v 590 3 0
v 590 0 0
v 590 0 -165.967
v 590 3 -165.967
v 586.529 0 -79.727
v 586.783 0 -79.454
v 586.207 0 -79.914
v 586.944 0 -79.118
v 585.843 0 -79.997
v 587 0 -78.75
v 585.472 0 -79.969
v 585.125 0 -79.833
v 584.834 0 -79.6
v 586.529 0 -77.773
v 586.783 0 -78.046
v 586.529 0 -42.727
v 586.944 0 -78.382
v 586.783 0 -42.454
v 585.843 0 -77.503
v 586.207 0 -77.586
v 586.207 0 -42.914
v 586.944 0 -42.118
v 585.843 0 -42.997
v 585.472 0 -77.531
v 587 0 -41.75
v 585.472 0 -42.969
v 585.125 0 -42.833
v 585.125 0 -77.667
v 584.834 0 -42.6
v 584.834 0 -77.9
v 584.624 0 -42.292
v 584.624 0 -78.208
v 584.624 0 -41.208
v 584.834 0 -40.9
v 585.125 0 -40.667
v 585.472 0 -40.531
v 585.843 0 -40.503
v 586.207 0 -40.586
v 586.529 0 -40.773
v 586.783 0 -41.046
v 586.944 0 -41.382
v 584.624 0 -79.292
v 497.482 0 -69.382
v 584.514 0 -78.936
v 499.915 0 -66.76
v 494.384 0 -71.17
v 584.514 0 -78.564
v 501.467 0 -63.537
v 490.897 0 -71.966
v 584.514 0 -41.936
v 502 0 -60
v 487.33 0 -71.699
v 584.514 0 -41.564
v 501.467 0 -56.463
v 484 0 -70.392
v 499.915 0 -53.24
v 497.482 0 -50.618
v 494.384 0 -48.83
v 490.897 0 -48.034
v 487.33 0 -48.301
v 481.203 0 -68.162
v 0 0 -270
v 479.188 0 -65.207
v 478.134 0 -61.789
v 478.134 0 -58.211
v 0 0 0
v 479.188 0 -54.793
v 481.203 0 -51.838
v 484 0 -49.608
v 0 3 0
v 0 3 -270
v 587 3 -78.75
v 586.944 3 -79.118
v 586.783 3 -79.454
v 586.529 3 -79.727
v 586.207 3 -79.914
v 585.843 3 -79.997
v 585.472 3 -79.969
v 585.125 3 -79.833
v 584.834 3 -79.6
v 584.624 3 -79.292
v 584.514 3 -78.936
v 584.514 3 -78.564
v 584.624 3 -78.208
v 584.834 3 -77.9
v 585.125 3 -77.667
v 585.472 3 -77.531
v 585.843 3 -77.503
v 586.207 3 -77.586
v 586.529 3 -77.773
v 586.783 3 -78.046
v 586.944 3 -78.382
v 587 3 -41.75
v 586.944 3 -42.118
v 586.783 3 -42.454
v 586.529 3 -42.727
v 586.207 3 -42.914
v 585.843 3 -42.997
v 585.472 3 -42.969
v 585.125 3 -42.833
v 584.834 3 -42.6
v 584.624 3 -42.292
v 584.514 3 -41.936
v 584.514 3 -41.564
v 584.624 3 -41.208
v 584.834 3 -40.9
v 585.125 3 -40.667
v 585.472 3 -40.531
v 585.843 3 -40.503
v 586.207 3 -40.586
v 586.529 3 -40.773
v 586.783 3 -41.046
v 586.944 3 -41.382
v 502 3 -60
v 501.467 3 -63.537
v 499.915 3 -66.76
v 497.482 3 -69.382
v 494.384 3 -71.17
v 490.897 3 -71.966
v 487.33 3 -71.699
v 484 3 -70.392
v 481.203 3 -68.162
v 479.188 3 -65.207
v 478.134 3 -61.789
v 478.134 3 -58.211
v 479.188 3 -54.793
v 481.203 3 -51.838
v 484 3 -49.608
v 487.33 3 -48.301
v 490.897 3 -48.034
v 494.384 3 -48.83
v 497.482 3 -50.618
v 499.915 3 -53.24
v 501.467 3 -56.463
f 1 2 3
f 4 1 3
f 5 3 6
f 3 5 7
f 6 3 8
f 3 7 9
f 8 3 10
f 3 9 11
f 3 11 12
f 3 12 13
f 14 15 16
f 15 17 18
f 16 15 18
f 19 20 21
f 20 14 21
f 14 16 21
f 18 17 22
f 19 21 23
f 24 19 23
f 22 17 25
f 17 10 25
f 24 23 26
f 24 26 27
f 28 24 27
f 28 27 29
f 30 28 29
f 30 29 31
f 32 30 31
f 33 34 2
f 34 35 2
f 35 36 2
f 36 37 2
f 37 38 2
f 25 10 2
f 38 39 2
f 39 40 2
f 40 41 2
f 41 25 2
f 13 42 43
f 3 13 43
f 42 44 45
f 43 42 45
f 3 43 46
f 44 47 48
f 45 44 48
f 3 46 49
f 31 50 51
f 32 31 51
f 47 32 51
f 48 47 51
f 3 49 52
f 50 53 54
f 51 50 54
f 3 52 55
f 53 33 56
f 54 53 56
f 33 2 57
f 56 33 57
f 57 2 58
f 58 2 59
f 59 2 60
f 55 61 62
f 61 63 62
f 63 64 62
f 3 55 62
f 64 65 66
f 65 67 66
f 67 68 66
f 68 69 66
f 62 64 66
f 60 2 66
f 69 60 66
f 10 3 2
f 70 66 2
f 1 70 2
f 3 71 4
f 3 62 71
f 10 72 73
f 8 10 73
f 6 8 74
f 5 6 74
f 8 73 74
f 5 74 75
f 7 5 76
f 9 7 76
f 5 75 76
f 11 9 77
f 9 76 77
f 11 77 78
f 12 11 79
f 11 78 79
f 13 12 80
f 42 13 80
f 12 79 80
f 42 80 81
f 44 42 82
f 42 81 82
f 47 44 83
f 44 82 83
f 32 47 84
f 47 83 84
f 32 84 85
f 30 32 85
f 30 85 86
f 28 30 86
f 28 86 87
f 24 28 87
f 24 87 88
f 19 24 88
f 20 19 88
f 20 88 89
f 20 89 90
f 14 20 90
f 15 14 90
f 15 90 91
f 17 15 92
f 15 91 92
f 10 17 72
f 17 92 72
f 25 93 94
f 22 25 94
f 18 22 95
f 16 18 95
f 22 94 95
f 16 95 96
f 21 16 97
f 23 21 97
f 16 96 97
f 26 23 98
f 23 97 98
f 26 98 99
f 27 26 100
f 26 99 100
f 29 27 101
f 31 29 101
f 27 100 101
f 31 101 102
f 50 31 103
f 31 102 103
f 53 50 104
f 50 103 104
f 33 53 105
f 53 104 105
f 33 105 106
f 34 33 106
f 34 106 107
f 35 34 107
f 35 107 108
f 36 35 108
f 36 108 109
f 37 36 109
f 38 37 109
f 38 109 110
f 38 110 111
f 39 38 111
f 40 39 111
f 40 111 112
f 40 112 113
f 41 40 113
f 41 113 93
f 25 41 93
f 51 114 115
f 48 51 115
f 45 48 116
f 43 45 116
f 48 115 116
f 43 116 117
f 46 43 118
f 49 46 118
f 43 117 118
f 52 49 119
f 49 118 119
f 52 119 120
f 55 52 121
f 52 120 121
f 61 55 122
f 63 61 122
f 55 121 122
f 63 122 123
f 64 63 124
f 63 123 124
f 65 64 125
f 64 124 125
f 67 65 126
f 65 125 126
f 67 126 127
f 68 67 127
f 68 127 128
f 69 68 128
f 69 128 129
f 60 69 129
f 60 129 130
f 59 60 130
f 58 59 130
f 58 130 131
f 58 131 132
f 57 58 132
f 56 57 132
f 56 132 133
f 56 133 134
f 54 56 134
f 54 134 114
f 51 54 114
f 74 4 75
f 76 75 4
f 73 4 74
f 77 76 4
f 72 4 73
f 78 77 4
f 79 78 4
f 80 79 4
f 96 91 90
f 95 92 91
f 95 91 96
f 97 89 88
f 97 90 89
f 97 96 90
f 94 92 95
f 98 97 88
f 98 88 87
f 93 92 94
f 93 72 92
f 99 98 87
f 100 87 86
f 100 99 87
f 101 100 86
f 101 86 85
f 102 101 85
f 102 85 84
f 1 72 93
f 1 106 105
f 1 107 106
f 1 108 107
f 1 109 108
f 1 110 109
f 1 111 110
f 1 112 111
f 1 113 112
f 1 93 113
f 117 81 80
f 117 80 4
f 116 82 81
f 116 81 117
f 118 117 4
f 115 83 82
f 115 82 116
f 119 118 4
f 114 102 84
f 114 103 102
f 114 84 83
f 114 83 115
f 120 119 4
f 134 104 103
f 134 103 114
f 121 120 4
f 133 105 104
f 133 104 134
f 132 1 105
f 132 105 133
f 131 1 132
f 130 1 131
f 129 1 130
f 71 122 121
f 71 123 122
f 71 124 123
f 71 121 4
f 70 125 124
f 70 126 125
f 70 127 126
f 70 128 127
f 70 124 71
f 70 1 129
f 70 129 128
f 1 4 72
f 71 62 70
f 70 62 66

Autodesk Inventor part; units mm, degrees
ref_plane "YZ Plane" through (0, 0, 0) normal (1, 0, 0) x (0, 1, 0)
ref_plane "XZ Plane" through (0, 0, 0) normal (0, 1, 0) x (-1, 0, 0)
ref_plane "XY Plane" through (0, 0, 0) normal (0, 0, 1) x (1, 0, 0)
sketch "Sketch1" plane through (0, 0, 0) normal (0, 1, 0) x (-1, 0, 0)
  line L0 (0, 0) -> (-590, 0)
  line L1 (-590, 0) -> (-590, -165.9671)
  line L2 (-590, -165.9671) -> (0, -165.9671)
  line L3 (0, -165.9671) -> (0, 0)
  line L4 (0, -165.9671) -> (0, -270)
  line L5 (0, -270) -> (-590, -165.9671)
  dimension "d0" = 590
  dimension "d28" = 270
  dimension "d29" = 10
extrude "Extrusion1" add sketch "Sketch1" along normal blind 3
sketch "Sketch3" plane through (0, 3, 0) normal (0, 1, 0) x (1, 0, 0)
  circle A0 centre (585.75, 41.75) radius 1.25
  circle A1 centre (585.75, 78.75) radius 1.25
  line L0 (590, 0) -> (590, 165.9671) projected
  line L1 (0, 0) -> (590, 0) projected
  dimension "d15" = 2.5
  dimension "d16" = 4.25
  dimension "d17" = 4.25
  dimension "d18" = 2.5
  dimension "d19" = 41.75
  dimension "d20" = 37
extrude "Extrusion3" cut sketch "Sketch3" along normal through all both and the other way through all
sketch "Sketch4" plane through (0, 3, 0) normal (0, 1, 0) x (1, 0, 0)
  circle A0 centre (490, 60) radius 12
  line L0 (0, 0) -> (590, 0) projected
  line L1 (590, 0) -> (590, 165.9671) projected
  dimension "d23" = 24
  dimension "d24" = 60
  dimension "d25" = 100
extrude "Extrusion4" cut sketch "Sketch4" against normal through all
equation "\"d16\" = d17"
equation "\"d18\" = d15"
properties part number "pinball-case-left-wall-outer"
